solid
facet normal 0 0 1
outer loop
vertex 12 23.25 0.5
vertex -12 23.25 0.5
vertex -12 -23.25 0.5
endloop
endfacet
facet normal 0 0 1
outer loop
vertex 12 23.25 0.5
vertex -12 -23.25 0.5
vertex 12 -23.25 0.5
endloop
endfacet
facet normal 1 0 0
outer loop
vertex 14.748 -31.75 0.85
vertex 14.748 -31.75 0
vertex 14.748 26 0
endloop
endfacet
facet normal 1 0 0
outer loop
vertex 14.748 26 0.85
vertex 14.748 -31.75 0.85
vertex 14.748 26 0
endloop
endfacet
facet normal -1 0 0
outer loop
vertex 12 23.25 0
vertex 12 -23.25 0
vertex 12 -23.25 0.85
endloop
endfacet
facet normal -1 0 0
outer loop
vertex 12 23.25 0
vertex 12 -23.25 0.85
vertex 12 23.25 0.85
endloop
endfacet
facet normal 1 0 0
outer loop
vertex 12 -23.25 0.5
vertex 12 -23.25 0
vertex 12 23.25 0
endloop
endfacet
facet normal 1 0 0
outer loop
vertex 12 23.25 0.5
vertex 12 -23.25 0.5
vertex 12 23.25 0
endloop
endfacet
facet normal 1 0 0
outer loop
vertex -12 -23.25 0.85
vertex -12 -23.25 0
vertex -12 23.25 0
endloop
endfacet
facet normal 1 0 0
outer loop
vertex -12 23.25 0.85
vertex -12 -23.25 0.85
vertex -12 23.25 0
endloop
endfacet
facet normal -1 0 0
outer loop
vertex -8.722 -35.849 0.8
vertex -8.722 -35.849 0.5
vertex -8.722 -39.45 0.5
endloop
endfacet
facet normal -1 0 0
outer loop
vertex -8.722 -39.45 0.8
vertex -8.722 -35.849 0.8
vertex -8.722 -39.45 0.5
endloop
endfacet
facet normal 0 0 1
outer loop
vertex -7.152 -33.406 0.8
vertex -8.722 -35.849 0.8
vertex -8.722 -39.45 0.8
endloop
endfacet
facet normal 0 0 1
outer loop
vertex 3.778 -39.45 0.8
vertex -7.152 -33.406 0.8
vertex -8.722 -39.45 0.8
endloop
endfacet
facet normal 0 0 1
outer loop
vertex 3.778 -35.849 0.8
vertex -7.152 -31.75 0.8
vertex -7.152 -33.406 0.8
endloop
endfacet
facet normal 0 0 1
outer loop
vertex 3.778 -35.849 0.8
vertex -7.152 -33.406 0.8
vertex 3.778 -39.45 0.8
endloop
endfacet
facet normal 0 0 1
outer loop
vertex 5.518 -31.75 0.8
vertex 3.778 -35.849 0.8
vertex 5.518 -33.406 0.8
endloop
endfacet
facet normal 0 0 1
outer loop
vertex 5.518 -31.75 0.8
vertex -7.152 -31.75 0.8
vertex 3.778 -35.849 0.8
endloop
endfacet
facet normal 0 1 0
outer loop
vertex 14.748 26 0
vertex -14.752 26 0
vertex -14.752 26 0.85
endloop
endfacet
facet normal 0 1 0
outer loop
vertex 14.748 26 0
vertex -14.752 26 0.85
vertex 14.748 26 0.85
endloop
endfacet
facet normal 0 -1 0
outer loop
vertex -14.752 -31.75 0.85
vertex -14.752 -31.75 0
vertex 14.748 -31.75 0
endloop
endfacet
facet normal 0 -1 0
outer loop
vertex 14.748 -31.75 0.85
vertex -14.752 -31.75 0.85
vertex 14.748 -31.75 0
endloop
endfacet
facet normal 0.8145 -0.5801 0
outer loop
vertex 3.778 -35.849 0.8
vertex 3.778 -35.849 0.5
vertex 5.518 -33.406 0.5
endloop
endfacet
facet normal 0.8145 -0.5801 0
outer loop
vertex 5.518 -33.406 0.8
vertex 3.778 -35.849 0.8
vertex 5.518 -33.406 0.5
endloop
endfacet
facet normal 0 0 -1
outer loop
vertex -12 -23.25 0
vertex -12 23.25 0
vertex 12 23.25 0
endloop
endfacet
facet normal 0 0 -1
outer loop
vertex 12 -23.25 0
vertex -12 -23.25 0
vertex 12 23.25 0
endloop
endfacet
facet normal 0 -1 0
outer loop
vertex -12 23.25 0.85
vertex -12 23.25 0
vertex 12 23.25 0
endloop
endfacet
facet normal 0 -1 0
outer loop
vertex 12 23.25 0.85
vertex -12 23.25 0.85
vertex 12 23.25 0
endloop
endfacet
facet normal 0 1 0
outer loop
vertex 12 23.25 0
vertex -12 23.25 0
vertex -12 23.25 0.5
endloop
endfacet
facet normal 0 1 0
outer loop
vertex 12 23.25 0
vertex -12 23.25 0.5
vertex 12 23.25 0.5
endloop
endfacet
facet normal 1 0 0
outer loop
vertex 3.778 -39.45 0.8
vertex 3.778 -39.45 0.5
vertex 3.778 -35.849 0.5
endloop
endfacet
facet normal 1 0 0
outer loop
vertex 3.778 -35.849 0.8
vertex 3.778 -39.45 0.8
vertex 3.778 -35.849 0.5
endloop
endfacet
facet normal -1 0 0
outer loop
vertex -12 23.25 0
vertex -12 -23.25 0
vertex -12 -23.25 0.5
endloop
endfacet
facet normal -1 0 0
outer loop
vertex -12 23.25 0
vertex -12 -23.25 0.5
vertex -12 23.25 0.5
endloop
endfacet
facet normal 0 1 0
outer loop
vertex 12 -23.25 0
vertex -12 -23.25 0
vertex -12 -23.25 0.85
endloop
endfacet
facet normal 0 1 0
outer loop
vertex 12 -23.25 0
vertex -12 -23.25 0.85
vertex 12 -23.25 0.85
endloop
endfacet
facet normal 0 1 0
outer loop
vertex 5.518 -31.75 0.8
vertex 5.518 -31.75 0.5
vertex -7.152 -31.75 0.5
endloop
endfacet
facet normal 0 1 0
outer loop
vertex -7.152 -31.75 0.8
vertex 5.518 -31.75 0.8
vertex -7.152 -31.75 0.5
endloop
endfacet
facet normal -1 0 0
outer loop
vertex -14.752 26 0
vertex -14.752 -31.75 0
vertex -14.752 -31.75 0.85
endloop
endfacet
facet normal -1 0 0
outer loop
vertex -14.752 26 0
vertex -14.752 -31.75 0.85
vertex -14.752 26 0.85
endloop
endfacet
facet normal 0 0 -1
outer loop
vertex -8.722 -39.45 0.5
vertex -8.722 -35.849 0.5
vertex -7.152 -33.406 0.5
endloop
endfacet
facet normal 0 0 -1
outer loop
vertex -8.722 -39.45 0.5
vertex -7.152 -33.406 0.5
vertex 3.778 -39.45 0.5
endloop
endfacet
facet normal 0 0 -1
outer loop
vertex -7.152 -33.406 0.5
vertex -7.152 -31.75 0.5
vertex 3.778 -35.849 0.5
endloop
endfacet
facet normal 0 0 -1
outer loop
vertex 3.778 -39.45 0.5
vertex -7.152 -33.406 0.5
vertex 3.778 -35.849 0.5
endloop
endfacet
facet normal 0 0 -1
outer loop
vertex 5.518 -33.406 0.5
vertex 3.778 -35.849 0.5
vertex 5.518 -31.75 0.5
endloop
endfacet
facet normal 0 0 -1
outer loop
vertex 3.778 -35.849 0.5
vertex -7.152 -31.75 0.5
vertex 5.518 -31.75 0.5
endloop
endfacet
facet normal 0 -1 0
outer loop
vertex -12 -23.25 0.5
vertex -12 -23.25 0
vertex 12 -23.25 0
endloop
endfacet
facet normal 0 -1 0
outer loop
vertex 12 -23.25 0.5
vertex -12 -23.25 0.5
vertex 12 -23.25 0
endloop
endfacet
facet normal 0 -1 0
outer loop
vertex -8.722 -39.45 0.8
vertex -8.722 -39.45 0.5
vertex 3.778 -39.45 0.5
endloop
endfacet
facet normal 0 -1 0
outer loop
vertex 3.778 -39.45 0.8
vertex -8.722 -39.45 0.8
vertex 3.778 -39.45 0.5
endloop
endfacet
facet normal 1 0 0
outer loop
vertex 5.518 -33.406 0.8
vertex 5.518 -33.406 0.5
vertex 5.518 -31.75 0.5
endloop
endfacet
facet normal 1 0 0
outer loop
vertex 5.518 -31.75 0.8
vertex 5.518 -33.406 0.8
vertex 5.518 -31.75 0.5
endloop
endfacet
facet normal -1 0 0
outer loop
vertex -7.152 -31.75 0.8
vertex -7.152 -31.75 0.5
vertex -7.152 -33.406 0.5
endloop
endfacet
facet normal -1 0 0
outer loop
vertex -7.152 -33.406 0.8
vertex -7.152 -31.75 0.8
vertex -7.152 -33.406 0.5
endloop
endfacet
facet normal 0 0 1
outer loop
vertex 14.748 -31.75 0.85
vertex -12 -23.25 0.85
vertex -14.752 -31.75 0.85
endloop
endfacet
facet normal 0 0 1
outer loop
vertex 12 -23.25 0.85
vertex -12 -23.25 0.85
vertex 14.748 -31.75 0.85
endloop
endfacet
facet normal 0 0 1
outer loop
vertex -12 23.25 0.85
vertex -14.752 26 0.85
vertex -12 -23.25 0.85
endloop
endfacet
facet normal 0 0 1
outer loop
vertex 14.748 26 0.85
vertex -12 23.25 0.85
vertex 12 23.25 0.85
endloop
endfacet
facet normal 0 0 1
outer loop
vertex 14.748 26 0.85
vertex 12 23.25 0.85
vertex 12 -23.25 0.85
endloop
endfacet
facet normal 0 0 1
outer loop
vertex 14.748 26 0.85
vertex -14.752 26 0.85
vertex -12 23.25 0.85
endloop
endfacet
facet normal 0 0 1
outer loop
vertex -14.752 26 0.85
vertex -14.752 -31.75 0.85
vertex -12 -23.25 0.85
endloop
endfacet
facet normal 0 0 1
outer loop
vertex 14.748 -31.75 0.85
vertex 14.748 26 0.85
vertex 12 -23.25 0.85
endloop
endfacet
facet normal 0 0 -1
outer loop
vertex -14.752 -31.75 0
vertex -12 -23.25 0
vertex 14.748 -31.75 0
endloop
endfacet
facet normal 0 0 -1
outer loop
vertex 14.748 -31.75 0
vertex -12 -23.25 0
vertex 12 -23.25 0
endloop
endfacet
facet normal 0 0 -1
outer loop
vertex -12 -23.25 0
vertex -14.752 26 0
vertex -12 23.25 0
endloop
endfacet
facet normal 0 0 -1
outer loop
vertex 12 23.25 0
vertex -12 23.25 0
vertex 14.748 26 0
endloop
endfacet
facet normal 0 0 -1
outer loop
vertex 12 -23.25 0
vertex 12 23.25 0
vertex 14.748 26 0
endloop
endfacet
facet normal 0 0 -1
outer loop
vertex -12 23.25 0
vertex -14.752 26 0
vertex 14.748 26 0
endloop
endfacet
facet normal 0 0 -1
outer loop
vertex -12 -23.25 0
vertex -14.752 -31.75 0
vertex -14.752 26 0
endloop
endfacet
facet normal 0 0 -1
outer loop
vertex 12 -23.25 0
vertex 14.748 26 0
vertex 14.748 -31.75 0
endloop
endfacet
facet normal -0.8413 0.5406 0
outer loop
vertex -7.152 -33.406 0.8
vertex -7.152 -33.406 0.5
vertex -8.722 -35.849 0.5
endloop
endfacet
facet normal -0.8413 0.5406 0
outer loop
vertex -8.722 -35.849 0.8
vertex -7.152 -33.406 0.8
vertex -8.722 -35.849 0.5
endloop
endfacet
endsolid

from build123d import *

# Parameters (mm, degrees)
MAIN_FEATURES_SKETCH_W = 24
MAIN_FEATURES_SKETCH_H = 46.5
DISPLAY_DEPTH          = 0.5
SKETCH1_3_W            = 24
SKETCH1_3_H            = 46.5
BEZEL_DEPTH            = 0.85
CABLE_START            = 0.5
CABLE_DEPTH            = 0.3


with BuildPart() as part:
    # main_features_sketch → display (new body)
    with BuildSketch(Plane.XY):
        Rectangle(MAIN_FEATURES_SKETCH_W, MAIN_FEATURES_SKETCH_H)
    extrude(amount=DISPLAY_DEPTH)


with BuildPart() as body_2:
    # Sketch1<3> → bezel (new body)
    with BuildSketch(Plane.XY):
        Polygon((-14.752, -31.75), (-7.152, -31.75), (5.518182239, -31.75), (14.748, -31.75), (14.748, 26), (-14.752, 26), align=None)
        Rectangle(SKETCH1_3_W, SKETCH1_3_H, mode=Mode.SUBTRACT)
    extrude(amount=BEZEL_DEPTH)


with BuildPart() as body_3:
    # Sketch1<4> → cable (new body)
    with BuildSketch(Plane.XY.offset(CABLE_START)):
        Polygon((5.518182239, -31.75), (-7.152, -31.75), (-7.152, -33.406095238), (-8.722, -35.849), (-8.722, -39.45), (3.778, -39.45), (3.778, -35.849), (5.518182239, -33.406095238), align=None)
    extrude(amount=CABLE_DEPTH)


solid = Compound([part.part, body_2.part, body_3.part])
